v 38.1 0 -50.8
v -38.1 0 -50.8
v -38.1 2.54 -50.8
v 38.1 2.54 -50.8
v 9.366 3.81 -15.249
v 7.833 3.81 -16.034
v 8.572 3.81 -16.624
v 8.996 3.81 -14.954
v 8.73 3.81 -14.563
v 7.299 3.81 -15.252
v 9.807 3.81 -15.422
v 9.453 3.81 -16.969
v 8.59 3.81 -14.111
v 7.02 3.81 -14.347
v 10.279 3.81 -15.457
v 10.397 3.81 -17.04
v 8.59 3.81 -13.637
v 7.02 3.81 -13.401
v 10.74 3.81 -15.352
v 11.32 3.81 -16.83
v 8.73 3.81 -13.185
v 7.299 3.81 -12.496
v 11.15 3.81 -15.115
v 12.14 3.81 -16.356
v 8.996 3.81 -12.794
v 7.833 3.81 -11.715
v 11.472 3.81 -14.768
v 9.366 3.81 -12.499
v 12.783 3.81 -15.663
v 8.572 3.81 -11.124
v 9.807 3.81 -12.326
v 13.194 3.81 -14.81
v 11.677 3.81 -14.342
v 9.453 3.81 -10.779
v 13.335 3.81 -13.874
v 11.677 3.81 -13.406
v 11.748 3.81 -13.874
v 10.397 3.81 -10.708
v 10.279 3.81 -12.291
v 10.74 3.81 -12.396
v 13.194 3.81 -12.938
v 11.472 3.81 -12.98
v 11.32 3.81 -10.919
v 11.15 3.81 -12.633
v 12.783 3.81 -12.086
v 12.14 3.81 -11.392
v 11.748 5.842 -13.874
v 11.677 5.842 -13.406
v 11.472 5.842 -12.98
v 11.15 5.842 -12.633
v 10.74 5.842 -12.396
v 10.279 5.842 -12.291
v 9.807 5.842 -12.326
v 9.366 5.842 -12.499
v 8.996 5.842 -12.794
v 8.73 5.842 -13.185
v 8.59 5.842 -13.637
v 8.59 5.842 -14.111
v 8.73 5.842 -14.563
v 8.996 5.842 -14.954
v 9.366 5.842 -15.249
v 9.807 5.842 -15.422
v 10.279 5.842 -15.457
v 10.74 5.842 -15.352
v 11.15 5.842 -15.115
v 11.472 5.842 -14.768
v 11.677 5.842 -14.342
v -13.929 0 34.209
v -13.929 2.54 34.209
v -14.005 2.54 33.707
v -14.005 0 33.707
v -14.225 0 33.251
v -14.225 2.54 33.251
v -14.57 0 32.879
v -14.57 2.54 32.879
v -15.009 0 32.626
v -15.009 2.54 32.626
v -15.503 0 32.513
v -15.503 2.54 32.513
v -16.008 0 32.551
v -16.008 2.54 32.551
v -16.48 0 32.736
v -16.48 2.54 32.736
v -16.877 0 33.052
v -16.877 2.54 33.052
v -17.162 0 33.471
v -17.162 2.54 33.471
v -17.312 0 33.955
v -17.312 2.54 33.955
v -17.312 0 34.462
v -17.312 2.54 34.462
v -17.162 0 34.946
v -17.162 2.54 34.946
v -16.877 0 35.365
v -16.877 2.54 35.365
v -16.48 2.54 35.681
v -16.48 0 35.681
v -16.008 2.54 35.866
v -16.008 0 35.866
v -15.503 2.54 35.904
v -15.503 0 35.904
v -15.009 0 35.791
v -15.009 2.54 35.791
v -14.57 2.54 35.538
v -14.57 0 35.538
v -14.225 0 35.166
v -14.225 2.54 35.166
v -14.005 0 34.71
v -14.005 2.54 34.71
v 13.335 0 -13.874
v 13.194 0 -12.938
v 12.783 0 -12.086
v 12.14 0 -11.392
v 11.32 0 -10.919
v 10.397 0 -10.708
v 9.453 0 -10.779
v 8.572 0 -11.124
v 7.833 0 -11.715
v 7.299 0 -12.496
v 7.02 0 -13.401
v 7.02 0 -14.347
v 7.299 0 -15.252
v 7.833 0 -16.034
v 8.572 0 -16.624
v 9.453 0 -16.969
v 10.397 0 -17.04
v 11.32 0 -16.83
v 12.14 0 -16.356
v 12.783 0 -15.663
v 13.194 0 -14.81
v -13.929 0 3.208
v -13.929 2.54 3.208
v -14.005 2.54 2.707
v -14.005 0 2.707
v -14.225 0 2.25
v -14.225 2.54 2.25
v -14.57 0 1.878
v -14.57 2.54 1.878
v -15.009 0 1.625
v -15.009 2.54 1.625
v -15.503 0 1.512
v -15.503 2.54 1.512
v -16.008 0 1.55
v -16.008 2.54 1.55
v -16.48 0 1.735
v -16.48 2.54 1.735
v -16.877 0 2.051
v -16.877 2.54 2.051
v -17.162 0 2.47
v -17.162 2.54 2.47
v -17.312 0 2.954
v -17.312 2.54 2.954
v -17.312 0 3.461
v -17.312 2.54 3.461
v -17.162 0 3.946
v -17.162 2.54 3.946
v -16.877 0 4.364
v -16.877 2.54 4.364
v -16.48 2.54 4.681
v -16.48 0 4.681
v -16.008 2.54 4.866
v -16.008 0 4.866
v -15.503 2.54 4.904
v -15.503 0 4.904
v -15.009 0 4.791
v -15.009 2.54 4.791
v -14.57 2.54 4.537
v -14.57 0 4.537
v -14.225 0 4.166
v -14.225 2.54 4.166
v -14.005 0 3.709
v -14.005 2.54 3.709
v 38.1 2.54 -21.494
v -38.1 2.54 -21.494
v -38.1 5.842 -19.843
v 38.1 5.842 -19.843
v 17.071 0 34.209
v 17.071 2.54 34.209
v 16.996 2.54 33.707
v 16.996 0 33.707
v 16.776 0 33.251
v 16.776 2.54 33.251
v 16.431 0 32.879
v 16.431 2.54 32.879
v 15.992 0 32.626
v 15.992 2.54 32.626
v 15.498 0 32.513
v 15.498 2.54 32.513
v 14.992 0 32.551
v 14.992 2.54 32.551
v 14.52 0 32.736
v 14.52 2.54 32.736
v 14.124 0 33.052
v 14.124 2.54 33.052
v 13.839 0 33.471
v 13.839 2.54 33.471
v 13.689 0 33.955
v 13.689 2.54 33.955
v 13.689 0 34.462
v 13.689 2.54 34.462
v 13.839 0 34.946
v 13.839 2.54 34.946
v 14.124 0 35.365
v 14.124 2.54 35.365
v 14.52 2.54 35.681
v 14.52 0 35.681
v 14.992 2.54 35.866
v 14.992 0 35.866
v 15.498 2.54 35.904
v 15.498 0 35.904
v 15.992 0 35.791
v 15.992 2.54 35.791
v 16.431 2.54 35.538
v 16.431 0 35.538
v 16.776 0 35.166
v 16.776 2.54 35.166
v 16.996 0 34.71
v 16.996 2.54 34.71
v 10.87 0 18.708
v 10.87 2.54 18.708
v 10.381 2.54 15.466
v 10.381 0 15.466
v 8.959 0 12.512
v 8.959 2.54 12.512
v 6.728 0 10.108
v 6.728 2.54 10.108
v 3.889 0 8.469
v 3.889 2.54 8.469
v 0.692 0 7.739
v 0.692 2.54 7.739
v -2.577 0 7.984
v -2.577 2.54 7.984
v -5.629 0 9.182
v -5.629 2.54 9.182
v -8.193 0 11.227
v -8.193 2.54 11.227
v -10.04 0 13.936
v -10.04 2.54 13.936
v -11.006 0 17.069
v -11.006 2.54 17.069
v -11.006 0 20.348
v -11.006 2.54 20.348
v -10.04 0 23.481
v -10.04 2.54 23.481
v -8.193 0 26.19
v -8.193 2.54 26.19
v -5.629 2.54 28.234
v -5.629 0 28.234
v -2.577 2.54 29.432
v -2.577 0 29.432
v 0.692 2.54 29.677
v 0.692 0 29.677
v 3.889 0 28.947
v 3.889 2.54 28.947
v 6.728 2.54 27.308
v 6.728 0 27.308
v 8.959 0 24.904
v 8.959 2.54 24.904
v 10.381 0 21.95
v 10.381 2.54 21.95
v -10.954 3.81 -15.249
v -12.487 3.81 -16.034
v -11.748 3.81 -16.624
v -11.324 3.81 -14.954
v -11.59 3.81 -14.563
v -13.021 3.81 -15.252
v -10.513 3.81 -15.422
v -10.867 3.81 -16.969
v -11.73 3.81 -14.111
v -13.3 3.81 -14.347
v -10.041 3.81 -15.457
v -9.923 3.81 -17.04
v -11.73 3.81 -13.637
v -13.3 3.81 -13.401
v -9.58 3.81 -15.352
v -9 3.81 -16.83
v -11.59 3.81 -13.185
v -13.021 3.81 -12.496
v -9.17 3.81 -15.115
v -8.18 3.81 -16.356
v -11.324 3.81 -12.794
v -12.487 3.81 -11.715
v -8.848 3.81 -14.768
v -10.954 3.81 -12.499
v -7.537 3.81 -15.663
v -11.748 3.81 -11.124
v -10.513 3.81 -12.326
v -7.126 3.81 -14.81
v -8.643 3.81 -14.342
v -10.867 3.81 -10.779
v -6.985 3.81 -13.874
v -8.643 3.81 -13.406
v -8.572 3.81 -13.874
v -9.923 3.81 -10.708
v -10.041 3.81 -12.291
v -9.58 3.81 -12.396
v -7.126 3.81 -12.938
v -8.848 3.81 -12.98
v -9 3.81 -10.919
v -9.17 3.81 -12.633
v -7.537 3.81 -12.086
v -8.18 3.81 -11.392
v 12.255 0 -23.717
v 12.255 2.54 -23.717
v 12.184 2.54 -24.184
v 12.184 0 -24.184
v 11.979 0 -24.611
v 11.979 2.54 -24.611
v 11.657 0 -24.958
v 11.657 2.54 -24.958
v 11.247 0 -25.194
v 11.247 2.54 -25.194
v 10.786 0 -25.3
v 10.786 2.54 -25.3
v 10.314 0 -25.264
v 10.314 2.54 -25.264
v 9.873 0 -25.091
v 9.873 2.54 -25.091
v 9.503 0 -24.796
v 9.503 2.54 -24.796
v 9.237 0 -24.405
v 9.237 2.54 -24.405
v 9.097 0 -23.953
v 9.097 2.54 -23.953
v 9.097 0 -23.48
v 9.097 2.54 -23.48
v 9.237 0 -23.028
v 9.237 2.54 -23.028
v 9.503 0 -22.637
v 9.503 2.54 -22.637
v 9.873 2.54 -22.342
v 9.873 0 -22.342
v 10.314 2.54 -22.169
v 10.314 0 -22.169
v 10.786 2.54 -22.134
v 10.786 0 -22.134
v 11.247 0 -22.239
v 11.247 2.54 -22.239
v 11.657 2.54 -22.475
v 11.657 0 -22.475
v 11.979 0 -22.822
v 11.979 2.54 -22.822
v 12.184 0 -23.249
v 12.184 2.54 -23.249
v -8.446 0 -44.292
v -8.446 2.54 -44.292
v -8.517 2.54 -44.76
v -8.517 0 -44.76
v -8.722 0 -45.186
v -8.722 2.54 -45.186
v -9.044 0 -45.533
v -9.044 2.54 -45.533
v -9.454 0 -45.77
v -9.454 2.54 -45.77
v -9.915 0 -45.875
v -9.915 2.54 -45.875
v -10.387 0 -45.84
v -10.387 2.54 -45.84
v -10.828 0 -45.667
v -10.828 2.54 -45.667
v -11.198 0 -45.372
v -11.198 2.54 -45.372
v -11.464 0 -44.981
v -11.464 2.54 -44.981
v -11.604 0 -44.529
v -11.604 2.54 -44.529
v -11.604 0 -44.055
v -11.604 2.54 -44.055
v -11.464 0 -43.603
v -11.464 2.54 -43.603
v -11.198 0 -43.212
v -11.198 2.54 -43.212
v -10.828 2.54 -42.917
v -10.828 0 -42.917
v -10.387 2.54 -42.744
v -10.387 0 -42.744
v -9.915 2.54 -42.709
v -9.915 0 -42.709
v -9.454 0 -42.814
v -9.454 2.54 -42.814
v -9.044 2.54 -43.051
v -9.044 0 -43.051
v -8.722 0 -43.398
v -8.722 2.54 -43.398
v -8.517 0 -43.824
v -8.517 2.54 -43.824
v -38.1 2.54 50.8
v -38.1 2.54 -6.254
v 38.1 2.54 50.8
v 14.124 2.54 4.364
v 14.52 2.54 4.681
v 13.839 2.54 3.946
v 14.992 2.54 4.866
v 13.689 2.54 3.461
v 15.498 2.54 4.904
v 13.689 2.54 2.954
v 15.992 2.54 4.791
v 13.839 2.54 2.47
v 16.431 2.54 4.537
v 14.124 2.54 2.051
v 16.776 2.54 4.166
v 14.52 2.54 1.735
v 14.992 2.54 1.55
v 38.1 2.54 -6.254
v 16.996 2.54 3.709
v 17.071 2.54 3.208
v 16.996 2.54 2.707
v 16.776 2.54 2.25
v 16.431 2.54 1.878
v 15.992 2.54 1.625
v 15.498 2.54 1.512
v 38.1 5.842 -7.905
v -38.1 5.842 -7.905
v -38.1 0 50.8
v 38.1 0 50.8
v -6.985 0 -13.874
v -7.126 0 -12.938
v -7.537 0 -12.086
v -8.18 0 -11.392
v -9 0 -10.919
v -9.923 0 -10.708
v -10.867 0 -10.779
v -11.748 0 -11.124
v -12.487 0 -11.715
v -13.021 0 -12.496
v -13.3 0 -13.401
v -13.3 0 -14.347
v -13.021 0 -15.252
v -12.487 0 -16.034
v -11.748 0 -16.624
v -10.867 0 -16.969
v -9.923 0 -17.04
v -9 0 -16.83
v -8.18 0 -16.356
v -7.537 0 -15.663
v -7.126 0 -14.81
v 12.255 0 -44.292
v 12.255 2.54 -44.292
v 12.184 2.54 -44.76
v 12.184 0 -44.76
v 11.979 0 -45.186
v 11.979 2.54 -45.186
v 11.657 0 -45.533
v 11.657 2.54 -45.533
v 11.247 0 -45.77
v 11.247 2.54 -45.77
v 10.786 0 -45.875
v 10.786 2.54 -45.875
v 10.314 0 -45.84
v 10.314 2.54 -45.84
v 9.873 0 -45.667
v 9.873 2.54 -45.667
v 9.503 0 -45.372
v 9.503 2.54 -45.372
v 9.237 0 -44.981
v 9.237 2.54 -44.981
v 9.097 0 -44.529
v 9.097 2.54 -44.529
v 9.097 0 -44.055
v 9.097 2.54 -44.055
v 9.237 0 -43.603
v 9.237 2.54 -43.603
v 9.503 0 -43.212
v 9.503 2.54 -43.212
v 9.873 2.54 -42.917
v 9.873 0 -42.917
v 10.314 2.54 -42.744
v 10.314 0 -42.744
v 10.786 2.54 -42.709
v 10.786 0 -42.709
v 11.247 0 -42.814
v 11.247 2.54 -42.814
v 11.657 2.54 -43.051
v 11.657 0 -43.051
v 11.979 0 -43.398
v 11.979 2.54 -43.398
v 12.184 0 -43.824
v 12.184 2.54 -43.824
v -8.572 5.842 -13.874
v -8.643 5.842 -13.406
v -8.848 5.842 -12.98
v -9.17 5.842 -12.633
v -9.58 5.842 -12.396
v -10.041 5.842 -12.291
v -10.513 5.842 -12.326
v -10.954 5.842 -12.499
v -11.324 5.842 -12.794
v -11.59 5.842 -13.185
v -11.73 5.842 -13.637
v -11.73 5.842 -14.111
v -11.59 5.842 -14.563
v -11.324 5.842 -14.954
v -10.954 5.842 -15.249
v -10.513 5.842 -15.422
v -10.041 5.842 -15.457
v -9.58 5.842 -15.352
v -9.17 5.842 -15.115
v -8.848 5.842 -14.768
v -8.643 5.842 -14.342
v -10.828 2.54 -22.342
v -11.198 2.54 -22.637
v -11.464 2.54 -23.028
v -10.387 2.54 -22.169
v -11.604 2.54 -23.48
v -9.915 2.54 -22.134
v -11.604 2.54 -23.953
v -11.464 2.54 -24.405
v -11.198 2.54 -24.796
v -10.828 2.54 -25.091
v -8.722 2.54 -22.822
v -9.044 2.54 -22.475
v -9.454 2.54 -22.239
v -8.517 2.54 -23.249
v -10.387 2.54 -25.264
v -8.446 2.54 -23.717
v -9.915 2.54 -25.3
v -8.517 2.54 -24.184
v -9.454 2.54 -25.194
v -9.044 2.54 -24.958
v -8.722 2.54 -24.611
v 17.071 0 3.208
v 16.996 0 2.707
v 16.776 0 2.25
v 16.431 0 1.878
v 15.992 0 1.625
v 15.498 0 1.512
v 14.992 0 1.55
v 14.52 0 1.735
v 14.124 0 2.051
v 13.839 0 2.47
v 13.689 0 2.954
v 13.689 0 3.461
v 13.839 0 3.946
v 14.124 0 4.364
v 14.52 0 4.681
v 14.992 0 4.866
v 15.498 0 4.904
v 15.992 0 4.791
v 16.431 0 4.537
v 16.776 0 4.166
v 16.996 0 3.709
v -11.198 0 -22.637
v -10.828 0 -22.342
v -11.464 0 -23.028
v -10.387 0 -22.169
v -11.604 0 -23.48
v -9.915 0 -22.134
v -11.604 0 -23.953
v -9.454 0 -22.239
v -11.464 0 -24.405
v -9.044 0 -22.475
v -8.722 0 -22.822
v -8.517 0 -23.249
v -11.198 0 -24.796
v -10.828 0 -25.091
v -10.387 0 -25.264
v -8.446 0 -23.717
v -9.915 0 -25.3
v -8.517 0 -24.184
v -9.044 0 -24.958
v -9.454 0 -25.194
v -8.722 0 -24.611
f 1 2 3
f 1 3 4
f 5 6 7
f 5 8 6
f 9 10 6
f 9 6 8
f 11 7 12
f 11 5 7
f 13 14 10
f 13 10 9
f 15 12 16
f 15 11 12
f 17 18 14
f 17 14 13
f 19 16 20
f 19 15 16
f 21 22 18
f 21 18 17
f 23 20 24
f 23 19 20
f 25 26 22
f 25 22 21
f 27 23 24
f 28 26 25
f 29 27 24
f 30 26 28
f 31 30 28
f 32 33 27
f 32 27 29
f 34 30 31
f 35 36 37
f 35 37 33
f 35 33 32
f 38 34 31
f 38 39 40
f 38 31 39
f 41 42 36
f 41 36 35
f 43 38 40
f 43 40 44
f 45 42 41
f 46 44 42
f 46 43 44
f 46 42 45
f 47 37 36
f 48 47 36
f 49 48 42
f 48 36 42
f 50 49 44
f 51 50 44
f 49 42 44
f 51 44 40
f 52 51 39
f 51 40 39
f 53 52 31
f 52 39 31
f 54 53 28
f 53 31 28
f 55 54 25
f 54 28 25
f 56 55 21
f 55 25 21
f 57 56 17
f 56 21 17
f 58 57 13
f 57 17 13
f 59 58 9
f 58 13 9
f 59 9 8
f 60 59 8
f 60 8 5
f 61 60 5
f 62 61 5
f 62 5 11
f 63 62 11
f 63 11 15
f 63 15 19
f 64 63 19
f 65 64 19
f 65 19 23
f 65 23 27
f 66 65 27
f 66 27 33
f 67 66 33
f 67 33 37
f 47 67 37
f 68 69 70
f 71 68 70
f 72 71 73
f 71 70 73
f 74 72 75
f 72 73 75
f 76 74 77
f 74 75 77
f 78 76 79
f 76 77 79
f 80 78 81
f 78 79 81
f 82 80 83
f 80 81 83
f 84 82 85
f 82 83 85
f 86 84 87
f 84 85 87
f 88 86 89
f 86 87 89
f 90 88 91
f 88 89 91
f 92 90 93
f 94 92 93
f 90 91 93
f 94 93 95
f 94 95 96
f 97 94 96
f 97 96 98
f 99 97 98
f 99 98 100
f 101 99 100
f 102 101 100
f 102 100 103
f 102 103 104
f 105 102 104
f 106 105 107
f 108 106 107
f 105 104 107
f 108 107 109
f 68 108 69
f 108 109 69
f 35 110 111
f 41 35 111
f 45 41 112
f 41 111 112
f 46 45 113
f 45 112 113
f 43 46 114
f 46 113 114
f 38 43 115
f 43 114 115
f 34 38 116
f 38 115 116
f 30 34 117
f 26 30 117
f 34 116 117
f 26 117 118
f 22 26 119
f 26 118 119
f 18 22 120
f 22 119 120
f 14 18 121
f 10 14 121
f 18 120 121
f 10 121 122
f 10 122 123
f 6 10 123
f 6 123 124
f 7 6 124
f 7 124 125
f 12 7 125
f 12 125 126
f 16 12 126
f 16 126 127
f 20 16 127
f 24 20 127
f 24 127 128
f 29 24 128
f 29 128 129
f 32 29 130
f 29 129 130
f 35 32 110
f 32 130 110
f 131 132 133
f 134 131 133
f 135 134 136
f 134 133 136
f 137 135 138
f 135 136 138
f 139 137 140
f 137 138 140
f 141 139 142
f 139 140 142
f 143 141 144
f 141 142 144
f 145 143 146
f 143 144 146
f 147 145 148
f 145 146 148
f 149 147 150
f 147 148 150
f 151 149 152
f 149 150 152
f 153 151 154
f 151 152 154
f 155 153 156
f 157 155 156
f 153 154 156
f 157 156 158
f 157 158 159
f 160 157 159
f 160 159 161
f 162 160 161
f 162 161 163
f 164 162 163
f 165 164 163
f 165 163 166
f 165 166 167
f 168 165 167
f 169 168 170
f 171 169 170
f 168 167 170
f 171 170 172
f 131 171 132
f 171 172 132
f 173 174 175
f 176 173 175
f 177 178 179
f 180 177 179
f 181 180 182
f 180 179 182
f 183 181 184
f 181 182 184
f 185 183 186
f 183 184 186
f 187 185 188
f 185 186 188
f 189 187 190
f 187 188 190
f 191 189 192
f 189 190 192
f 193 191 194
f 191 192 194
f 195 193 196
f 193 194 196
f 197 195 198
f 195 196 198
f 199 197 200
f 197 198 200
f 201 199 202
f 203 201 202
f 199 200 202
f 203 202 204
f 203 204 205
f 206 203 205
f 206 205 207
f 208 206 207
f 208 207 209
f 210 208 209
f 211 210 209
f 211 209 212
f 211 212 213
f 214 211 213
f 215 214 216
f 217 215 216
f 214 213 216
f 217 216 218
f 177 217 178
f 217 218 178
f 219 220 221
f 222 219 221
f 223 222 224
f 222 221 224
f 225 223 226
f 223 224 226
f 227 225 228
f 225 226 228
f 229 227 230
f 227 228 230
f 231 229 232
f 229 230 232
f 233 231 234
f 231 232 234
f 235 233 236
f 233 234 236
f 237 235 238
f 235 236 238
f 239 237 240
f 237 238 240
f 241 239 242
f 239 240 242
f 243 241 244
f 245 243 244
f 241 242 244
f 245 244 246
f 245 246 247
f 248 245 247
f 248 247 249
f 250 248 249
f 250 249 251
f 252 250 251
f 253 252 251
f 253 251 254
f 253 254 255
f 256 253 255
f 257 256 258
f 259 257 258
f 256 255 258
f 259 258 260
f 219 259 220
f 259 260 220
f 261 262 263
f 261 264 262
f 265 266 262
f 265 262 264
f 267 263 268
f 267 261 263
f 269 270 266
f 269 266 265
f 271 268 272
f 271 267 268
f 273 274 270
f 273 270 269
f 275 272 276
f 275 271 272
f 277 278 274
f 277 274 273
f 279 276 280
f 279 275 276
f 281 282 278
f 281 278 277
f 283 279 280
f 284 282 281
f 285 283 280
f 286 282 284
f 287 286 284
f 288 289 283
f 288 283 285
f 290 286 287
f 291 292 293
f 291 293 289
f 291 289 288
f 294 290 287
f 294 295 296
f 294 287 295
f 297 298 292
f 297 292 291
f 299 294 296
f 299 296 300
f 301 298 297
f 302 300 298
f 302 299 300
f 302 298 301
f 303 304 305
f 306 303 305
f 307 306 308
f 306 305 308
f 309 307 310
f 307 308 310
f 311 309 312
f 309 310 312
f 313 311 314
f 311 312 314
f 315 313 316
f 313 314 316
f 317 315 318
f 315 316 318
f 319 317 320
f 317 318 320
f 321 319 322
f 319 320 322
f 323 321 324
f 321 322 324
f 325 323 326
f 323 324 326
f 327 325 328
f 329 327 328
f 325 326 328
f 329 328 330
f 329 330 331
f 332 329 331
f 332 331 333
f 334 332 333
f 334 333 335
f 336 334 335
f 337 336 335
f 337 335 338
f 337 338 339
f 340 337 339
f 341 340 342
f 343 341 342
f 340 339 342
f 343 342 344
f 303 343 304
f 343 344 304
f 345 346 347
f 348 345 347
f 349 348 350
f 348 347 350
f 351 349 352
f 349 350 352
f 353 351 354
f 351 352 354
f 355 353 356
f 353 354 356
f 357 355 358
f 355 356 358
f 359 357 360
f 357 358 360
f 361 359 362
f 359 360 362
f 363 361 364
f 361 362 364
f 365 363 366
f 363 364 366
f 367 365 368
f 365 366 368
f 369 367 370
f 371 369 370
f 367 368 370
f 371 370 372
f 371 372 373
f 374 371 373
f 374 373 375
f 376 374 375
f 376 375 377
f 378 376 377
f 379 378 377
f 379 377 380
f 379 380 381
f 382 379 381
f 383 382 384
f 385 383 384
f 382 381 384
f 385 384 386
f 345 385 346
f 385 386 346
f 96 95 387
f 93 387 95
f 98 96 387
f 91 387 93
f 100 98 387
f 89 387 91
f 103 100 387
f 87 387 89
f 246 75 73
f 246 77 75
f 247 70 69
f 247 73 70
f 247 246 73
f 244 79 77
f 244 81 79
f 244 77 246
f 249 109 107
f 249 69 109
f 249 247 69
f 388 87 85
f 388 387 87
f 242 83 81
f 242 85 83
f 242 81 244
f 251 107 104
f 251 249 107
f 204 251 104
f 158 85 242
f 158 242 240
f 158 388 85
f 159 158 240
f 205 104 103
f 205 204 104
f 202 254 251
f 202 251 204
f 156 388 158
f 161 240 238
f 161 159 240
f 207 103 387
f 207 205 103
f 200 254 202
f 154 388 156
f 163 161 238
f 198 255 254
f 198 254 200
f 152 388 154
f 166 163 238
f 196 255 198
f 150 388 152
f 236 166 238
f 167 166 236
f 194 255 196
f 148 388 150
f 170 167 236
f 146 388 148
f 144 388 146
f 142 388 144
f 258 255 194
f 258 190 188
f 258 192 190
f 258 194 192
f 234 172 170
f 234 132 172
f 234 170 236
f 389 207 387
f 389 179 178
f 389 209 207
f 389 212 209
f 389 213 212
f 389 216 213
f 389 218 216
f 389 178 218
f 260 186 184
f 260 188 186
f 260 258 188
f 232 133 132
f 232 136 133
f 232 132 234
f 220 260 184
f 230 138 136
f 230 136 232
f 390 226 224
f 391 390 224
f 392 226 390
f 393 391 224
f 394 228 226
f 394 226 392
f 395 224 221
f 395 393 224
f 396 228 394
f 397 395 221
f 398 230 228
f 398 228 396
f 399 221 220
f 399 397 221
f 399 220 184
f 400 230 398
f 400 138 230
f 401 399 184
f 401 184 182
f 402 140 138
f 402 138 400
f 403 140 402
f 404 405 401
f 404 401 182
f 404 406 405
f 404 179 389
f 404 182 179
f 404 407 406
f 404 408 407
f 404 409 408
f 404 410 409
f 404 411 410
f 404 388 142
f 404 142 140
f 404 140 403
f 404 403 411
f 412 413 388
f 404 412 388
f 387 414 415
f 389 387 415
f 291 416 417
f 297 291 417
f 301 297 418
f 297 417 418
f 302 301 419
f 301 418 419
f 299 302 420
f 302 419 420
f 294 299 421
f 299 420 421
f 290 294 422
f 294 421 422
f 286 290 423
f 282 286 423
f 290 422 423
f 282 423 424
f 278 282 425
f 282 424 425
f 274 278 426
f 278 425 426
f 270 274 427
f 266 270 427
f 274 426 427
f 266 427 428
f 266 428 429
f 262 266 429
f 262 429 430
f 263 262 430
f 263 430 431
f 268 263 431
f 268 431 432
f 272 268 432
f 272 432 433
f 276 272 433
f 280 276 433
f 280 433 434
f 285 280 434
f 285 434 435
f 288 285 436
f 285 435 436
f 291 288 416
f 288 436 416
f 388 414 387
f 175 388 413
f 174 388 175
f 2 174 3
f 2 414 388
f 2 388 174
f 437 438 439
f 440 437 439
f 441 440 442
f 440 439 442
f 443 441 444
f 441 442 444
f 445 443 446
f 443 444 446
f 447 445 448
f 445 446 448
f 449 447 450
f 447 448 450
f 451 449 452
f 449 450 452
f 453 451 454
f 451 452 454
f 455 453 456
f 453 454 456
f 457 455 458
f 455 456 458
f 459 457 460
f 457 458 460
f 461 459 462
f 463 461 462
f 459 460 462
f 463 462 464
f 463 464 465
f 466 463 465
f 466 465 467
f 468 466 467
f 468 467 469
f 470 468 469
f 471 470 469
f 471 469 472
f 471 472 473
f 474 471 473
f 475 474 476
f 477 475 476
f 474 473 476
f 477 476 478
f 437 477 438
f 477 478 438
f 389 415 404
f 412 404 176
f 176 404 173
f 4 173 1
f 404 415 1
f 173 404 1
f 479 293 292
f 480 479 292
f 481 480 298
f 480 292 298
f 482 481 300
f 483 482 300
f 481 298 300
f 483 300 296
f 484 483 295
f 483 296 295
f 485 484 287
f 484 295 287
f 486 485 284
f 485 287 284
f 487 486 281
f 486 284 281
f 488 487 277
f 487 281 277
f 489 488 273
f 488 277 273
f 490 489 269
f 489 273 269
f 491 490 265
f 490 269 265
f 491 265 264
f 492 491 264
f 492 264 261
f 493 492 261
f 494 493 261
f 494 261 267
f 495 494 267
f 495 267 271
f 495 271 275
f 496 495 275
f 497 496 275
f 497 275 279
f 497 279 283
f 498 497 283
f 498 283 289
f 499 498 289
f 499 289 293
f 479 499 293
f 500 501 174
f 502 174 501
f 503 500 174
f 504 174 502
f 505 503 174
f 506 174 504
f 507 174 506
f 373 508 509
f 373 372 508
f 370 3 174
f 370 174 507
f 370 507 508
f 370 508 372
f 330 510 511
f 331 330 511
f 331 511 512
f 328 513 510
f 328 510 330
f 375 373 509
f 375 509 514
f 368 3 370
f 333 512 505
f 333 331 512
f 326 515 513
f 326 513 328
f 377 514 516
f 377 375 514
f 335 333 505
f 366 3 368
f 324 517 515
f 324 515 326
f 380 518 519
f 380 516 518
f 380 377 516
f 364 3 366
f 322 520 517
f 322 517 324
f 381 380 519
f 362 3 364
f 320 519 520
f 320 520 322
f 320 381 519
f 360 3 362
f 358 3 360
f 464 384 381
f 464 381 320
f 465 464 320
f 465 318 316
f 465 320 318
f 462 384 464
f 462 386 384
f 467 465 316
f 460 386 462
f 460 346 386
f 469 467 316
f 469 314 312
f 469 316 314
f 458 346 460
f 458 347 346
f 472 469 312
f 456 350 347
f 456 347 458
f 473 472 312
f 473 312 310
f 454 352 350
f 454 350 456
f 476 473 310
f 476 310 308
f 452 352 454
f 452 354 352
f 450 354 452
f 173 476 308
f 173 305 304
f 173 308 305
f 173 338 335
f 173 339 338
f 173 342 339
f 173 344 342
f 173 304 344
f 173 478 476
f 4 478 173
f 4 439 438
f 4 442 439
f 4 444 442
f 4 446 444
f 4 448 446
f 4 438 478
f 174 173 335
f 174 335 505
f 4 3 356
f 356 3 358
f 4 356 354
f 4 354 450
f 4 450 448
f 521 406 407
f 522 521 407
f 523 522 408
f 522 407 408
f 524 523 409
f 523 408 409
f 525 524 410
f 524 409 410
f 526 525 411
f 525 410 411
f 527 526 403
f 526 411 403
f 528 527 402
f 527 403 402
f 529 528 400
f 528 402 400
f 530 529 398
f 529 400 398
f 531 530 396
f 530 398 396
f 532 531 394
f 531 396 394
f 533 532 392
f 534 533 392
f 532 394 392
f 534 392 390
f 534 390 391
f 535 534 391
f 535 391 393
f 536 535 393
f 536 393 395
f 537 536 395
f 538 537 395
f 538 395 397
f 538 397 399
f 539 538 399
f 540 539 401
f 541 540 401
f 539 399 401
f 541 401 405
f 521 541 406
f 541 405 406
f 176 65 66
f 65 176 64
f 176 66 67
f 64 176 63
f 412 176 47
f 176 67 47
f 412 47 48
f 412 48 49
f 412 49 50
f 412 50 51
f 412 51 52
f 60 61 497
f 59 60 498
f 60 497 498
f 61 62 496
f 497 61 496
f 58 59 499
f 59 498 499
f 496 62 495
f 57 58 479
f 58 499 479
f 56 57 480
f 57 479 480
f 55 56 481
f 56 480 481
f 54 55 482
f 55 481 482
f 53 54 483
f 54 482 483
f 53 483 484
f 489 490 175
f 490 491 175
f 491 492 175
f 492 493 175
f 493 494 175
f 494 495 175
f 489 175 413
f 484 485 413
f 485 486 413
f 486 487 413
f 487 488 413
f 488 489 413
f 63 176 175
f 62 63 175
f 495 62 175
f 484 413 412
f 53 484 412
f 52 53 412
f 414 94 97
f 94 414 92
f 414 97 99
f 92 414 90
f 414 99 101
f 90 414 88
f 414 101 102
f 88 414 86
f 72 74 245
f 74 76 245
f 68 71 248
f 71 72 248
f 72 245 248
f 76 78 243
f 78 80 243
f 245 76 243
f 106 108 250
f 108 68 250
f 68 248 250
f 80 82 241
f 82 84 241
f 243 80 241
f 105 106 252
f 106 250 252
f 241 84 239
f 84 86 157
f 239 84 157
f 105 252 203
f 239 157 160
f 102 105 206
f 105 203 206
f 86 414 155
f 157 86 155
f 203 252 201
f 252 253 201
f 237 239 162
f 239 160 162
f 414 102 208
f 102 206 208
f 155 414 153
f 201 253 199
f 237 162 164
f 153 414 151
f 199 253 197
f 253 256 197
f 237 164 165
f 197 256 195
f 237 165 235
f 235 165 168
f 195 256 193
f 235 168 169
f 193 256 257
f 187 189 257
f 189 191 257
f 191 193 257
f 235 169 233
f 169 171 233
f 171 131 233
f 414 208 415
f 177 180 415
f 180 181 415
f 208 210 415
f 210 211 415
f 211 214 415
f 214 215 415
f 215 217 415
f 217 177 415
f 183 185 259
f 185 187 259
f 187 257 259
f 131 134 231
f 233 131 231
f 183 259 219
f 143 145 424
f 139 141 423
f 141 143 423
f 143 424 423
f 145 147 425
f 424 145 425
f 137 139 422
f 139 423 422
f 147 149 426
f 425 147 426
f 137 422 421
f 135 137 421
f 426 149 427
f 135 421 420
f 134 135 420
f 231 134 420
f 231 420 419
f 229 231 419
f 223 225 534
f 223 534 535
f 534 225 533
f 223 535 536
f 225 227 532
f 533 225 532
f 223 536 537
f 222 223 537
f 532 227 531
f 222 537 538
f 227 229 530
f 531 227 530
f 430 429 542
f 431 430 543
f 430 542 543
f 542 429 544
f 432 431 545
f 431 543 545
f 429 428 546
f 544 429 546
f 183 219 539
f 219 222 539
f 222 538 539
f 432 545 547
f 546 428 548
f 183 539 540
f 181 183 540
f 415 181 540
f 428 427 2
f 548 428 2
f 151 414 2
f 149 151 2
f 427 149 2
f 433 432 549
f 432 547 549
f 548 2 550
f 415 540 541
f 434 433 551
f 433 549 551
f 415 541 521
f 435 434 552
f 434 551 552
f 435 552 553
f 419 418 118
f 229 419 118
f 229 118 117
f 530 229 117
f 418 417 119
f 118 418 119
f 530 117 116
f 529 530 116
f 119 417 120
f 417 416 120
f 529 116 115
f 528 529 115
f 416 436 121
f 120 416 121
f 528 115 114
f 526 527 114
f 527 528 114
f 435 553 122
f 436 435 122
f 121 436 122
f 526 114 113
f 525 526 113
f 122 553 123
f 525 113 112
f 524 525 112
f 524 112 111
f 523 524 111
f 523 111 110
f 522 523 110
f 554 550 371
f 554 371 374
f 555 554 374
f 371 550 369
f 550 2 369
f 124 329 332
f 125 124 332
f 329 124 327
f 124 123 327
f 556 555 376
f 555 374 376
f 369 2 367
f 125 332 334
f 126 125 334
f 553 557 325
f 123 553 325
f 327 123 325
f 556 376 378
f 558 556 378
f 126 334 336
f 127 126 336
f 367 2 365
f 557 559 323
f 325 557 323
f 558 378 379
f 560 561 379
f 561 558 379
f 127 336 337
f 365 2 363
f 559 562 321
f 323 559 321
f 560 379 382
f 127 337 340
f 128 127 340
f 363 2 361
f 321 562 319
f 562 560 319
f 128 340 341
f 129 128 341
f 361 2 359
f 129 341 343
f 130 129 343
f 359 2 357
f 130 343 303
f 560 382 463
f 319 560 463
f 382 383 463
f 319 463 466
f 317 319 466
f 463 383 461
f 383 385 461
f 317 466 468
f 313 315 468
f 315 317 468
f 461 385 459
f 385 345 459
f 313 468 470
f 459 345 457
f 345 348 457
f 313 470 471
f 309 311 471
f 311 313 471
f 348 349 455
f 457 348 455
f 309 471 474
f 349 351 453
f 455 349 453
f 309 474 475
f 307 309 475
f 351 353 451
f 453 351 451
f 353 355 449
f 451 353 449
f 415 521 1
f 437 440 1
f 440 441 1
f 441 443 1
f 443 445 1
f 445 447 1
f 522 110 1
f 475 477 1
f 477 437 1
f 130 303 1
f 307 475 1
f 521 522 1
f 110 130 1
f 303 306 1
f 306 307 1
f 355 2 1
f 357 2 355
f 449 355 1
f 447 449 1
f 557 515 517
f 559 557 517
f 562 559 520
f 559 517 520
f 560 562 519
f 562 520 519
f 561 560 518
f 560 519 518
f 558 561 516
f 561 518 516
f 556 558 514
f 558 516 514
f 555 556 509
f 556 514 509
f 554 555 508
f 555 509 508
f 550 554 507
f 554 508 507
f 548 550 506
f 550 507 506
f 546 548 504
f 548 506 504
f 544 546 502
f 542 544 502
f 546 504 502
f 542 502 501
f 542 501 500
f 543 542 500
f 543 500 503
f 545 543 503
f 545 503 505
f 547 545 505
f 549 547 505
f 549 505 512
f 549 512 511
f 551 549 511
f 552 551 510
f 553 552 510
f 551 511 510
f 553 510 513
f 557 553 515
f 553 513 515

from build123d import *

# Parameters (mm, degrees)
SKETCH1_W           = 76.2
SKETCH1_H           = 101.6
BOSS_EXTRUDE1_DEPTH = 2.54
SKETCH2_R           = 1.5875
SKETCH2_R_2         = 1.70053
SKETCH2_R_3         = 10.99947
CUT_EXTRUDE1_DEPTH  = 2.54
BOSS_EXTRUDE2_DEPTH = 76.2
SKETCH4_R           = 3.175
CUT_EXTRUDE2_DEPTH  = 3.81
SKETCH5_R           = 1.5875
CUT_EXTRUDE3_DEPTH  = 3.032


with BuildPart() as part:
    # Sketch1 → Boss-Extrude1 (new body)
    with BuildSketch(Plane(origin=(0, 0, 0), x_dir=(1, 0, 0), z_dir=(0, 1, 0))):
        Rectangle(SKETCH1_W, SKETCH1_H)
    extrude(amount=BOSS_EXTRUDE1_DEPTH)

    # Sketch2 → Cut-Extrude1 (cut)
    with BuildSketch(Plane(origin=(0, 2.54, 0), x_dir=(1, 0, 0), z_dir=(0, 1, 0))):
        with Locations((-10.033800765, 44.29206639)):
            Circle(SKETCH2_R)
        with Locations((10.667199235, 44.29206639)):
            Circle(SKETCH2_R)
        with Locations((10.667199235, 23.71656639)):
            Circle(SKETCH2_R)
        with Locations((-10.033800765, 23.71656639)):
            Circle(SKETCH2_R)
        with Locations((-15.629995159, -3.207813583)):
            Circle(SKETCH2_R_2)
        with Locations((15.370704841, -3.207813583)):
            Circle(SKETCH2_R_2)
        with Locations((15.370704841, -34.208513583)):
            Circle(SKETCH2_R_2)
        with Locations((-15.629995159, -34.208513583)):
            Circle(SKETCH2_R_2)
        with Locations((-0.129645159, -18.708163583)):
            Circle(SKETCH2_R_3)
    extrude(amount=-CUT_EXTRUDE1_DEPTH, mode=Mode.SUBTRACT)

    # Sketch3 → Boss-Extrude2 (add)
    with BuildSketch(Plane(origin=(-38.1, 0, -50.8), x_dir=(0, 0, -1), z_dir=(1, 0, 0))):
        Polygon((-44.54593361, 2.54), (-29.30593361, 2.54), (-30.95693361, 5.842), (-42.89493361, 5.842), align=None)
    extrude(amount=BOSS_EXTRUDE2_DEPTH)

    # Sketch4 → Cut-Extrude2 (cut)
    with BuildSketch(Plane.XZ):
        with Locations((-10.16, -13.87406639)):
            Circle(SKETCH4_R)
        with Locations((10.16, -13.87406639)):
            Circle(SKETCH4_R)
    extrude(amount=-CUT_EXTRUDE2_DEPTH, mode=Mode.SUBTRACT)

    # Sketch5 → Cut-Extrude3 (cut, through all)
    with BuildSketch(Plane.XZ.offset(-3.81)):
        with Locations((-10.16, -13.87406639)):
            Circle(SKETCH5_R)
        with Locations((10.16, -13.87406639)):
            Circle(SKETCH5_R)
    extrude(amount=-CUT_EXTRUDE3_DEPTH, mode=Mode.SUBTRACT)


solid = part.part
